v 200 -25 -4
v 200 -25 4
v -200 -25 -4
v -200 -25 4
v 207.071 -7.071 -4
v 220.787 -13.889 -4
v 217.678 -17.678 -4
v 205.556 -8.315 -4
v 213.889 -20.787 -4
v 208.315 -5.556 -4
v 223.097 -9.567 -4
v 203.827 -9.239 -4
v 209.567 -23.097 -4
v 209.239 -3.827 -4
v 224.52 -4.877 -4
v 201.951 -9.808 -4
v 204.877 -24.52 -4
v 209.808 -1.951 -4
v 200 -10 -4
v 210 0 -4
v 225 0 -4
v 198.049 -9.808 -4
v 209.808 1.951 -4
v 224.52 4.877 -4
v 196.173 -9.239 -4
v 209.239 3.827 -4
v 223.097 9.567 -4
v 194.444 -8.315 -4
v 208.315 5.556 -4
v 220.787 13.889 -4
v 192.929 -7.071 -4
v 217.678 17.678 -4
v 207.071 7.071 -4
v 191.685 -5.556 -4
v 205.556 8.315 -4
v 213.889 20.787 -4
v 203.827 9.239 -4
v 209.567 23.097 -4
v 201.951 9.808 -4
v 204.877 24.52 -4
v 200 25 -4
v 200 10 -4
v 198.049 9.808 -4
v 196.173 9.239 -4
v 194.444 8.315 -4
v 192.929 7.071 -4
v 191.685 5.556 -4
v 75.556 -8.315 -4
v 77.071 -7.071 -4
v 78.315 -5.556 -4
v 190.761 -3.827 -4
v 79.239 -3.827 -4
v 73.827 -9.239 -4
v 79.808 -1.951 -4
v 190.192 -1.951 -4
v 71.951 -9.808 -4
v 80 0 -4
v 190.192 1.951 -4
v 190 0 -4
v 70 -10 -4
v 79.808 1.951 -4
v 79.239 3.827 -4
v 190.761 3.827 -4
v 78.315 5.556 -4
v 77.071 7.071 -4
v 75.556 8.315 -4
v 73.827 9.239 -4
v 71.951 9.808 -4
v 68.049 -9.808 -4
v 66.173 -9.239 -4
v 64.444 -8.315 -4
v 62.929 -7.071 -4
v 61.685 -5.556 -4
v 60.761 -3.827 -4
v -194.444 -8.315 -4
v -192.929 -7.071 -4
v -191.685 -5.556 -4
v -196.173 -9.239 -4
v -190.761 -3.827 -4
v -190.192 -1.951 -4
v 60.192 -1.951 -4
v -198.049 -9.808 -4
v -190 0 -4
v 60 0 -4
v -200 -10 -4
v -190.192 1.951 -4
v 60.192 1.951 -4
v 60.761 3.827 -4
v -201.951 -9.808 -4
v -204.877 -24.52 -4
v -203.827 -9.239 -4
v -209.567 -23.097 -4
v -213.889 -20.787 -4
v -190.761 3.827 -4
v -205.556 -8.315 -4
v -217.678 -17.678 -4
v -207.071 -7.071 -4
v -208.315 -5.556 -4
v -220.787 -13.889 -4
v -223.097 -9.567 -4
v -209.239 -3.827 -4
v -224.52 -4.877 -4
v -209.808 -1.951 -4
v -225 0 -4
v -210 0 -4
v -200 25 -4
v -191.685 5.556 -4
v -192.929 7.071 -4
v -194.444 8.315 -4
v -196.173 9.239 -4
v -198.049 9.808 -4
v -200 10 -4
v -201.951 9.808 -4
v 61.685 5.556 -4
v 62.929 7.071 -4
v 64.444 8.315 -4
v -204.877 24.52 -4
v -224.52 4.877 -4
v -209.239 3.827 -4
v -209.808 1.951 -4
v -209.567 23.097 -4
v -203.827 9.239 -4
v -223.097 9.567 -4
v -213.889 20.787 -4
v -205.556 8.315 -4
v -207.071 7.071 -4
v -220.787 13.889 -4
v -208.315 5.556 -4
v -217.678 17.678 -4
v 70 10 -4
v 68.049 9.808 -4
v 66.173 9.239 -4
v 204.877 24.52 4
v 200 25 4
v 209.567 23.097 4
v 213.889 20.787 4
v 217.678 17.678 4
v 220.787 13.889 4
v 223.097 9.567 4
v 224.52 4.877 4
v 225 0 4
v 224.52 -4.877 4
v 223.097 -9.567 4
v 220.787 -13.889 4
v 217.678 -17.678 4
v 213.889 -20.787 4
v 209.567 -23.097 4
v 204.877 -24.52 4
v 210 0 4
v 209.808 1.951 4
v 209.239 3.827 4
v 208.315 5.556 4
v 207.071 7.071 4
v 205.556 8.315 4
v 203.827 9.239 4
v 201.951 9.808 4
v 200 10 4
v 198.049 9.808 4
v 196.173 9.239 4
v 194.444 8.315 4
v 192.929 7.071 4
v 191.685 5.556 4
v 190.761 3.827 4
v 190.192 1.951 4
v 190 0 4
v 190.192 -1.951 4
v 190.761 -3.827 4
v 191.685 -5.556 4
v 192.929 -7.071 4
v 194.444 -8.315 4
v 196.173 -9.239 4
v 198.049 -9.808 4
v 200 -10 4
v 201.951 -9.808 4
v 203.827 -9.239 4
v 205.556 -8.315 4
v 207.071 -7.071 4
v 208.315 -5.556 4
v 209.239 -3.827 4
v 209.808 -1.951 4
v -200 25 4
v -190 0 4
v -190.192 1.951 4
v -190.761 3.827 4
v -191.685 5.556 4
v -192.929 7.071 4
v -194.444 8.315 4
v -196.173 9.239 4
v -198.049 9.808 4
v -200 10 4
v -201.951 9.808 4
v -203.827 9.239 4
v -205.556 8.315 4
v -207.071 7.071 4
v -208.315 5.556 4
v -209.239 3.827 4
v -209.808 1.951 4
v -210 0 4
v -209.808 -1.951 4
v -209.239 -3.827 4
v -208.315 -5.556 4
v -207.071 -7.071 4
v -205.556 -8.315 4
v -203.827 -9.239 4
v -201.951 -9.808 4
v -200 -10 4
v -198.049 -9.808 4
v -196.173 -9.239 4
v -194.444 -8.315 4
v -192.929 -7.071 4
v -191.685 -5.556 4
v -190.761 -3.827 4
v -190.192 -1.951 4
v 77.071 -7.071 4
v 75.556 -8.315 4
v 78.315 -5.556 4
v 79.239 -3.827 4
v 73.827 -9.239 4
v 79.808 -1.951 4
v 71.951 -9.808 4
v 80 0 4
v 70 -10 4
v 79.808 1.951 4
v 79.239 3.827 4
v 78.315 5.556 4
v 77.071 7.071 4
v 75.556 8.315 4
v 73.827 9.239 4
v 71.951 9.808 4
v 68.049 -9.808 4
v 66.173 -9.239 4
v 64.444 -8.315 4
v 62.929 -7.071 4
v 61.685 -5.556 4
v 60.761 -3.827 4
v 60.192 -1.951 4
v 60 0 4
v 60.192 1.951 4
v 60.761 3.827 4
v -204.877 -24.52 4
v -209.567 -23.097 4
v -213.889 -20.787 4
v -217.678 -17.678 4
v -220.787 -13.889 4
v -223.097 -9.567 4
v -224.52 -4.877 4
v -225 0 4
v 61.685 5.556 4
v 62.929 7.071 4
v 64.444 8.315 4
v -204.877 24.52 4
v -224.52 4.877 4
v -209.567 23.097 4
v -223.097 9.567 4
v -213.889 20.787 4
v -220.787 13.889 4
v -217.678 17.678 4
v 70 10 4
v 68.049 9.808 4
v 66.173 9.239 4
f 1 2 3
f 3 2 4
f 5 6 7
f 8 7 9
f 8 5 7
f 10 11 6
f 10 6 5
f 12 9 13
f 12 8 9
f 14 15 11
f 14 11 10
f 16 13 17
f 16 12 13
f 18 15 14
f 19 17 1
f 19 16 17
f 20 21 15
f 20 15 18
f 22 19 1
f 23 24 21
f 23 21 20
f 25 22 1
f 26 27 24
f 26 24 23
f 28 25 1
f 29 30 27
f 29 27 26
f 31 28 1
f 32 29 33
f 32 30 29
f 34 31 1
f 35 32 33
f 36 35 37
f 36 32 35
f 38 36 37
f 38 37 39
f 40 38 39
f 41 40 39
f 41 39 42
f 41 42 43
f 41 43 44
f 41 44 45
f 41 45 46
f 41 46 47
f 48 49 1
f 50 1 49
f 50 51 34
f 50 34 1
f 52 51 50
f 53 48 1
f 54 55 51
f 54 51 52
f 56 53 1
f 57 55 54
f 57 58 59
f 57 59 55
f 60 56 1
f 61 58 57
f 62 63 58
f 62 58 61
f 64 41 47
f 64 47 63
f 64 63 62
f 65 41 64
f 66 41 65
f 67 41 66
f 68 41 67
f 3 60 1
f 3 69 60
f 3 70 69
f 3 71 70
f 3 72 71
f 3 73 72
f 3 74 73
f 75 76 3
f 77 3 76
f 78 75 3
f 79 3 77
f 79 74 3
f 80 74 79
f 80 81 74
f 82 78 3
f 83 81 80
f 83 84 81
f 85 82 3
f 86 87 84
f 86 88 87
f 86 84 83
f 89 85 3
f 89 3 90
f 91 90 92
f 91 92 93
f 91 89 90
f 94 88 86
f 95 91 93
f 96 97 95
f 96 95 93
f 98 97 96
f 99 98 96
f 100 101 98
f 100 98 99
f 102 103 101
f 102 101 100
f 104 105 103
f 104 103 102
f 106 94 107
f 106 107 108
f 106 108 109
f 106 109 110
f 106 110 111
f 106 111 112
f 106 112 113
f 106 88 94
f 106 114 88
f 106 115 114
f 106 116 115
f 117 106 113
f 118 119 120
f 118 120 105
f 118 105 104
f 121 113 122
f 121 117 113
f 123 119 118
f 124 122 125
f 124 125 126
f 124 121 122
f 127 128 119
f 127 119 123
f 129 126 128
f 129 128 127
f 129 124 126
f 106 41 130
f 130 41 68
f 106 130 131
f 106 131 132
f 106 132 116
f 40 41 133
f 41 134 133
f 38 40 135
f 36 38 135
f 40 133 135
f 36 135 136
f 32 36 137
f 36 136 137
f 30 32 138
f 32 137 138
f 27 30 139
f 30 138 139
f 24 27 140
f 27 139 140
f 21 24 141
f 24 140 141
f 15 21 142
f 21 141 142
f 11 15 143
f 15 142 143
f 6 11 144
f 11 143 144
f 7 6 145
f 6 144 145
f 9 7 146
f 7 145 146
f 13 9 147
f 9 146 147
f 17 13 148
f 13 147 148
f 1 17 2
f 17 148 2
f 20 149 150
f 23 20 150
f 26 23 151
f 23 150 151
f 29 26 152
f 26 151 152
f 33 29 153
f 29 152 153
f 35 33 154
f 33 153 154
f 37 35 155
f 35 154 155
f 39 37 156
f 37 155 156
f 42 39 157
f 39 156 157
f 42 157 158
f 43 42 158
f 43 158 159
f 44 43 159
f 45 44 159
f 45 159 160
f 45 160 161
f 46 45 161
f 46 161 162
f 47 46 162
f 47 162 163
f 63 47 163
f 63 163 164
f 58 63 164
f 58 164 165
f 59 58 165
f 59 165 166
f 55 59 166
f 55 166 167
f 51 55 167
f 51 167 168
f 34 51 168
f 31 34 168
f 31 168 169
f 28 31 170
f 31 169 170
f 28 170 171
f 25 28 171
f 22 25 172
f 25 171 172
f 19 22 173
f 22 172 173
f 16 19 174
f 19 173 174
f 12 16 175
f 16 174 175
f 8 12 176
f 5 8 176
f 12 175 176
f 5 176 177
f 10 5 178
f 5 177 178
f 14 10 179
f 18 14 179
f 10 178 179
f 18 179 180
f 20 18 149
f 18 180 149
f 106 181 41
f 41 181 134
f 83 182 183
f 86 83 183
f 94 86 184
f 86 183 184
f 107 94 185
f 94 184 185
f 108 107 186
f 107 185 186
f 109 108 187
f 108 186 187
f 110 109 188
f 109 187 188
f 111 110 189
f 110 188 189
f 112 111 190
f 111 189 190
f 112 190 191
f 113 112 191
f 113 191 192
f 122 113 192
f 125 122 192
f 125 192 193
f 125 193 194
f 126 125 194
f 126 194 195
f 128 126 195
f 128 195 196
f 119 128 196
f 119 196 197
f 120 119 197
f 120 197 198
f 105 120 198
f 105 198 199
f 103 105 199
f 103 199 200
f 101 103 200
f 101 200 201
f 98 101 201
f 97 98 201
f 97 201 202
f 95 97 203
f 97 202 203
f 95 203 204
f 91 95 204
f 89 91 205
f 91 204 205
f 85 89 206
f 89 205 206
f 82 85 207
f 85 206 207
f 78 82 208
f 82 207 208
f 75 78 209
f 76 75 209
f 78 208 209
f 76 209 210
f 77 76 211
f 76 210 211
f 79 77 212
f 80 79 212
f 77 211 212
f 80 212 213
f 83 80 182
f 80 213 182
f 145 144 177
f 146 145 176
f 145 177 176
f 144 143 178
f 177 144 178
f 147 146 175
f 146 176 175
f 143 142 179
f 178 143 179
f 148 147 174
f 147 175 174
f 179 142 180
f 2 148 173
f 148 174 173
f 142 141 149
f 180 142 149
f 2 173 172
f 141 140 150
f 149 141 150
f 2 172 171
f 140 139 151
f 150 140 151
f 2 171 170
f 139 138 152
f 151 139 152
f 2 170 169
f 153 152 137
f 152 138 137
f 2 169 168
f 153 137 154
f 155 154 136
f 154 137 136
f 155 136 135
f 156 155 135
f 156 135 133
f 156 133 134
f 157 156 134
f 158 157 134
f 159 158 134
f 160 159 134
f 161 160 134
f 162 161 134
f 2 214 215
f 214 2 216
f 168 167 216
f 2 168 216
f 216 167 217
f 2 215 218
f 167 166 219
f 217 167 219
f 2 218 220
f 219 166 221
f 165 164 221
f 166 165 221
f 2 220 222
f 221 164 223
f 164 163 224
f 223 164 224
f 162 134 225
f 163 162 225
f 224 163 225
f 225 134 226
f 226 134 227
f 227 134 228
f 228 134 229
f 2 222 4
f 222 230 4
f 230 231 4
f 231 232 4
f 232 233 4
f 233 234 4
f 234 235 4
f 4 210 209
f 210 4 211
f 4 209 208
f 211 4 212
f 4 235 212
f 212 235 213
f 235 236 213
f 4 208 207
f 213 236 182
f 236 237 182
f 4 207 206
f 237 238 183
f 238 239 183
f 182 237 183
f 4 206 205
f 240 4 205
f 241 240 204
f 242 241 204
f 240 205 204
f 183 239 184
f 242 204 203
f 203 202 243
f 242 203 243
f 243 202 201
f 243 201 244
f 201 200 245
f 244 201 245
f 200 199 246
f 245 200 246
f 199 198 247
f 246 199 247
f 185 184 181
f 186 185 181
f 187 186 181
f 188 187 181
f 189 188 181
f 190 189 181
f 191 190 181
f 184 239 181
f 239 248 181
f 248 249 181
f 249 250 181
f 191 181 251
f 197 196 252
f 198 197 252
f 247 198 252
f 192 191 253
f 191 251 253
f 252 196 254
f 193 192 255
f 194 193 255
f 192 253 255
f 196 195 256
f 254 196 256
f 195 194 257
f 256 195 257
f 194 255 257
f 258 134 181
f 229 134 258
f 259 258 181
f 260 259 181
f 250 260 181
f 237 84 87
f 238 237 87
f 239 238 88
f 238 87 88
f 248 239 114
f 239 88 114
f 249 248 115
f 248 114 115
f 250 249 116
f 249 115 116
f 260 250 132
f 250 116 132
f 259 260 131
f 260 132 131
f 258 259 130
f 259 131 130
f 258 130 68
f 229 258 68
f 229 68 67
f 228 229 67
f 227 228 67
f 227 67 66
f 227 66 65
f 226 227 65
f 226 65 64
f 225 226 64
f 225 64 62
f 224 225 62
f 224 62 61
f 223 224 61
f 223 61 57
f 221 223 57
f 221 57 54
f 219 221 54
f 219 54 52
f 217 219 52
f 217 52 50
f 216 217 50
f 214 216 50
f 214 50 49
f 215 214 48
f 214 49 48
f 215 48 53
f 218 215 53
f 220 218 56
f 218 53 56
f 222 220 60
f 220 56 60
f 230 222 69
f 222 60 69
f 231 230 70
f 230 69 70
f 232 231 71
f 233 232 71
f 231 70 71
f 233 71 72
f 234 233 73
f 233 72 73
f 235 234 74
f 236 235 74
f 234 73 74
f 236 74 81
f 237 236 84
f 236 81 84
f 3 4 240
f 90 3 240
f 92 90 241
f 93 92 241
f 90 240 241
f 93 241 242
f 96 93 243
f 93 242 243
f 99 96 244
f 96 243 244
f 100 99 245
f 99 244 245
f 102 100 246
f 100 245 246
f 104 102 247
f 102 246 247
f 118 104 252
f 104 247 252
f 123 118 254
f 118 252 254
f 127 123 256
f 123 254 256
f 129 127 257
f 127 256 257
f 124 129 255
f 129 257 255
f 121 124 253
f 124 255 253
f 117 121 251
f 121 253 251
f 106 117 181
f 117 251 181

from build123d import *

# Parameters (mm, degrees)
BOSS_EXTRU_1_DEPTH      = 4
ESQUISSE2_R             = 10
ENL_V_MAT_EXTRU_1_DEPTH = 227.525936705
ESQUISSE3_R             = 10
ENL_V_MAT_EXTRU_2_DEPTH = 227.525936705


with BuildPart() as part:
    # Esquisse1 → Boss.-Extru.1 (new, symmetric)
    with BuildSketch(Plane.XY):
        with BuildLine():
            Line((-200, 25), (200, 25))
            ThreePointArc((200, 25), (225, 0), (200, -25))
            Line((200, -25), (-200, -25))
            ThreePointArc((-200, -25), (-225, 0), (-200, 25))
        make_face()
    extrude(amount=BOSS_EXTRU_1_DEPTH, both=True)

    # Esquisse2 → Enlèv. mat.-Extru.1 (cut, through all)
    with BuildSketch(Plane.XY.offset(4)):
        with Locations((-200, 0)):
            Circle(ESQUISSE2_R)
        with Locations((200, 0)):
            Circle(ESQUISSE2_R)
    extrude(amount=-ENL_V_MAT_EXTRU_1_DEPTH, mode=Mode.SUBTRACT)

    # Esquisse3 → Enlèv. mat.-Extru.2 (cut, through all)
    with BuildSketch(Plane(origin=(0, 0, -4), x_dir=(-1, 0, 0), z_dir=(0, 0, -1))):
        with Locations((-70, 0)):
            Circle(ESQUISSE3_R)
    extrude(amount=-ENL_V_MAT_EXTRU_2_DEPTH, mode=Mode.SUBTRACT)


solid = part.part
